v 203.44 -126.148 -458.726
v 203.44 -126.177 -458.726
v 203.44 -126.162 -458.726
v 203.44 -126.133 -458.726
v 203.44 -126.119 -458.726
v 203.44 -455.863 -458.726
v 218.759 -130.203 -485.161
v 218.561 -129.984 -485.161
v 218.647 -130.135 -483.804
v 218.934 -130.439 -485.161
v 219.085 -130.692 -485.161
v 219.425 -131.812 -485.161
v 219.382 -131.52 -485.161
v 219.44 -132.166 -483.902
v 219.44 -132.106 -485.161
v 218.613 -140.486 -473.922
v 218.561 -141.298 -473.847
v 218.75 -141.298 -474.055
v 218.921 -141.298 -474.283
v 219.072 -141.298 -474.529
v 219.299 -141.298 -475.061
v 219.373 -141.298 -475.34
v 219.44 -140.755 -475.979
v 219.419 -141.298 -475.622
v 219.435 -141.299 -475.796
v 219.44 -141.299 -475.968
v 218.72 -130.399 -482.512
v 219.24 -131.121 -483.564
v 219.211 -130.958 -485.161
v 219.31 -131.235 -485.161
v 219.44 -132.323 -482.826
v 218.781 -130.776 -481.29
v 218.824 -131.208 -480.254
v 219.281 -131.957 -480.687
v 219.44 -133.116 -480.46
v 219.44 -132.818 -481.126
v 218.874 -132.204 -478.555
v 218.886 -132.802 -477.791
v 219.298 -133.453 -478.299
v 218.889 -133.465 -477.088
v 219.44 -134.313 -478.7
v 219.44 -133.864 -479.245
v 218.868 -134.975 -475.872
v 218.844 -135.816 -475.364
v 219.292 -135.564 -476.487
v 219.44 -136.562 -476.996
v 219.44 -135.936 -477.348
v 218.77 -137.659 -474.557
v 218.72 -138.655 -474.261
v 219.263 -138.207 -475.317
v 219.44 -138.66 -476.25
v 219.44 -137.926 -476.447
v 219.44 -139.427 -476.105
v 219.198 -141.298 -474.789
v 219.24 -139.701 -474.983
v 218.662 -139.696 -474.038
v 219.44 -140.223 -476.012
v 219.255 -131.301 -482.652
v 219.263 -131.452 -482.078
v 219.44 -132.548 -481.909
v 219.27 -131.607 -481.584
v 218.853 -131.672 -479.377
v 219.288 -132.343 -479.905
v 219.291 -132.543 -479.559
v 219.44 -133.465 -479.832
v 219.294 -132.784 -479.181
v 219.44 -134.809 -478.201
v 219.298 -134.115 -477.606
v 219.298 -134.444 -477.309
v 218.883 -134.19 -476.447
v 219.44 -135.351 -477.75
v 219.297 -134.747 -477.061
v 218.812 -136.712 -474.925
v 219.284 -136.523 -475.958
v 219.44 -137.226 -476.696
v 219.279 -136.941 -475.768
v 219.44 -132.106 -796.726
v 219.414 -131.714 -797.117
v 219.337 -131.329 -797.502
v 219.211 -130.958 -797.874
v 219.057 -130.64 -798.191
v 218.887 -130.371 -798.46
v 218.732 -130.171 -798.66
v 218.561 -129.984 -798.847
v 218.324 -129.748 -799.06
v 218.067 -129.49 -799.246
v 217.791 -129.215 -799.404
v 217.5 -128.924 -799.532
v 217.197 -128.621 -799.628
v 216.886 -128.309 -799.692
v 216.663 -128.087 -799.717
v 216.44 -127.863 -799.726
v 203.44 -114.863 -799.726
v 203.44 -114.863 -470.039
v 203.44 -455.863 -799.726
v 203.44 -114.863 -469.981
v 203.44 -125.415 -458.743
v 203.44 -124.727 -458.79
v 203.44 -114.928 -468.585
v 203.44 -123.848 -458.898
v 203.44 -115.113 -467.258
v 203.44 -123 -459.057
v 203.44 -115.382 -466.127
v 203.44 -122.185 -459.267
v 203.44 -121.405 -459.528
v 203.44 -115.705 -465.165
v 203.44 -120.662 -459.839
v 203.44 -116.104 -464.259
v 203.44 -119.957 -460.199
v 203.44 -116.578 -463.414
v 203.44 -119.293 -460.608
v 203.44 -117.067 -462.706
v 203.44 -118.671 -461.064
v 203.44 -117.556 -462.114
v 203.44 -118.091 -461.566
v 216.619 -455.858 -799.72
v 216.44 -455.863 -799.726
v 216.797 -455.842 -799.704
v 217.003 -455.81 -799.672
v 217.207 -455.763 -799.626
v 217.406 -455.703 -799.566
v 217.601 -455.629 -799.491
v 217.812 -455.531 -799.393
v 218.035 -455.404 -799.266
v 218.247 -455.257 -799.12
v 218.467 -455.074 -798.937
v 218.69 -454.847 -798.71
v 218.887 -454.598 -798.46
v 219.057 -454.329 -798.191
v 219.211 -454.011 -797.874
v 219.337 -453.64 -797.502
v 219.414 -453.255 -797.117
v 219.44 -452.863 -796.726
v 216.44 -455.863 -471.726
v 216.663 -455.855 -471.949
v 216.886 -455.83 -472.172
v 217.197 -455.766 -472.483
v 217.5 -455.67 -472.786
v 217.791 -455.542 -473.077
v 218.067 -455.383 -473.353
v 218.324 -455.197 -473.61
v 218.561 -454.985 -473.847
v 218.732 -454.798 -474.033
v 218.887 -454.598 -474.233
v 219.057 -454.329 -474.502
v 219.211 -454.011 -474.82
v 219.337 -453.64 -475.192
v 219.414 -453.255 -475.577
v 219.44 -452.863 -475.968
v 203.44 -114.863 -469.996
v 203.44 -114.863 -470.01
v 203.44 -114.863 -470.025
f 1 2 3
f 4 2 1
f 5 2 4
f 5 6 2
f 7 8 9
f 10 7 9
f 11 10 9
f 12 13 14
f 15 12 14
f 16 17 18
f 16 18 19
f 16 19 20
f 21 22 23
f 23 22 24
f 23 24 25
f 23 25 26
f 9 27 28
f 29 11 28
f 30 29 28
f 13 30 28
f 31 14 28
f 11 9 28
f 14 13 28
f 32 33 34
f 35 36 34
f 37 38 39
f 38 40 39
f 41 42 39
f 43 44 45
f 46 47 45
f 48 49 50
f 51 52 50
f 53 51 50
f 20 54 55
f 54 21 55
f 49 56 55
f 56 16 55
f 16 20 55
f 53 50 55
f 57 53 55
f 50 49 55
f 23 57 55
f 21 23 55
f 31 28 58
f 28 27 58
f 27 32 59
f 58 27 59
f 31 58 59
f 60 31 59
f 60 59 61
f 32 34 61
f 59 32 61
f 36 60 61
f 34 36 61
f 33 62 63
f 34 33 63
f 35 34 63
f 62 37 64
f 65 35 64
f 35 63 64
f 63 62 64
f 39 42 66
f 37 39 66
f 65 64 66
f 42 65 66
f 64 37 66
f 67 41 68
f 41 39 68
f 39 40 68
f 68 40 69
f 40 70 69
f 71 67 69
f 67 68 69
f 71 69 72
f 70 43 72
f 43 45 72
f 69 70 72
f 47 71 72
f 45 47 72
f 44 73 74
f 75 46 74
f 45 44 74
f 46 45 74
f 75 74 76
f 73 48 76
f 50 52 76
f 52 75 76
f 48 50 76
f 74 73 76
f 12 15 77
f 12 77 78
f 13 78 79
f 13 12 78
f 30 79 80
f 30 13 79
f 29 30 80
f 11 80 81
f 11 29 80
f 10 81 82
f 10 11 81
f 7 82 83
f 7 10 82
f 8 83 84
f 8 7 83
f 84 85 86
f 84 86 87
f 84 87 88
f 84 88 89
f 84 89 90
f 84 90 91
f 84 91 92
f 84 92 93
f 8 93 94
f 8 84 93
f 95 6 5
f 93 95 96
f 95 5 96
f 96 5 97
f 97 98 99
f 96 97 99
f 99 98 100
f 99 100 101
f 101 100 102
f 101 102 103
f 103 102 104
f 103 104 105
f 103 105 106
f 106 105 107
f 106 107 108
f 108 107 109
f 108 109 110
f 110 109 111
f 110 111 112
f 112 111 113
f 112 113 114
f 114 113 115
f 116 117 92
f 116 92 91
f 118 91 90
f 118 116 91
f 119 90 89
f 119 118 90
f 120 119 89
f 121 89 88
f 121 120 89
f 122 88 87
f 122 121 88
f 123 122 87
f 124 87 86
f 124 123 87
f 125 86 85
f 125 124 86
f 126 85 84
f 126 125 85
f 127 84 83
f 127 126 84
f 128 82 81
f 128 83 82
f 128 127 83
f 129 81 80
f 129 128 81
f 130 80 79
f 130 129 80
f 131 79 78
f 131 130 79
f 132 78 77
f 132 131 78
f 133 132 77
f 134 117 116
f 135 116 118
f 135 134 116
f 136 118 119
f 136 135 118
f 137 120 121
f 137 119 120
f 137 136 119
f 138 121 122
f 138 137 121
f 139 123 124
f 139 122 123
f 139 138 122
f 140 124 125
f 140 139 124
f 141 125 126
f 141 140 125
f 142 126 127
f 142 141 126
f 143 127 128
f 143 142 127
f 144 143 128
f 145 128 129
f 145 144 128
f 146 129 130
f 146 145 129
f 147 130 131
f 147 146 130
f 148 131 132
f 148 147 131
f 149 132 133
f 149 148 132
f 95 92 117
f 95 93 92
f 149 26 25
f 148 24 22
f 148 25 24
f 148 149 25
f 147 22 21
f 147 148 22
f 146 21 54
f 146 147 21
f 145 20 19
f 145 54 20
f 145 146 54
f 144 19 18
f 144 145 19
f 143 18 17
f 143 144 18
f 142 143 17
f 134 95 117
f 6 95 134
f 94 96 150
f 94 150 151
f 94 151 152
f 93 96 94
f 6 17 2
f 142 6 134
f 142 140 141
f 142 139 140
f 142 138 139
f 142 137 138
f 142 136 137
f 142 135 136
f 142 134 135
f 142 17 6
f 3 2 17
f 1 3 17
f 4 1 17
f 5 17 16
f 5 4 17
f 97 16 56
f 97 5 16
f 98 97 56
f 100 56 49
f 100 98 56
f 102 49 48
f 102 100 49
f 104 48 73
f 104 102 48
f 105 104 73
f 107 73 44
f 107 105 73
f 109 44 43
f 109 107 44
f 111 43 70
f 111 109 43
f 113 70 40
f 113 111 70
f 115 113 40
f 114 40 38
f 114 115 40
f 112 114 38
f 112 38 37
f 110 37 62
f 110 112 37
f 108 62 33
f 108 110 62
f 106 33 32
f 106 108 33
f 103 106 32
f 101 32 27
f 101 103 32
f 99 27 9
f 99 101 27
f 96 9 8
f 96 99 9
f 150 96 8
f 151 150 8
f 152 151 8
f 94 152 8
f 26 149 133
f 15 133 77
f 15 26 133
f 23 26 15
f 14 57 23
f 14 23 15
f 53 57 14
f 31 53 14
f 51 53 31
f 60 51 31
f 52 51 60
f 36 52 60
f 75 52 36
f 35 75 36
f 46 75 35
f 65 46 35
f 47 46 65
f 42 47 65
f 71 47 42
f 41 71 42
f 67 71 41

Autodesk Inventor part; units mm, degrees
ref_plane "YZ Plane" through (0, 0, 0) normal (1, 0, 0) x (0, 1, 0)
ref_plane "XZ Plane" through (0, 0, 0) normal (0, 1, 0) x (-1, 0, 0)
ref_plane "РабПлоскость1" through (203.4395, -285.3633, -641.5751) normal (1, 0, 0) x (0, 1, 0)
sketch "Эскиз1" plane through (203.4395, -285.3633, -641.5751) normal (1, 0, 0) x (0, 1, 0)
  line L0 (-170.4999, 182.8495) -> (170.5001, 182.8495)
  line L1 (170.5001, 182.8495) -> (170.5001, -158.1505)
  line L2 (170.5001, -158.1505) -> (-170.4999, -158.1505)
  line L3 (-170.4999, -158.1505) -> (-170.4999, 182.8495)
  point P0 (285.3633, 641.5751)
  point P1 (49.5, 182.8495)
  point P2 (-170.4999, 137.85)
  dimension "d5" = 341
  dimension "d6" = 341
extrude "Выдавливание1" add sketch "Эскиз1" along normal blind 16
chamfer "Фаска1" distance 16 angle 45 1 edges at (219.4395, -114.8632, -629.2256)
sketch "Эскиз2" plane through (203.4395, -455.8632, -458.7256) normal (0, 0, 1) x (1, 0, 0)
  line L0 (16, 0) -> (16, 325) projected
  point P0 (-203.4395, 455.8632)
  point P1 (16, 220)
sketch "Эскиз3" plane through (219.4395, -285.3633, -641.5751) normal (1, 0, 0) x (0, 0, -1)
  line L0 (-182.8495, -170.4999) -> (158.1505, -170.4999) projected
  point P0 (-137.85, -170.4999)
chamfer "Фаска2" distance 16 angle 45 1 edges at (219.4395, -293.3631, -458.7256)
fillet "Сопряжение1" radius 16 1 edges at (211.4395, -122.8631, -466.7255)
fillet "Сопряжение2" radius 3 5 edges at (219.4395, -133.8946, -477.757) (219.4395, -299.02, -474.7255) (219.4395, -130.8631, -642.8824) (219.4395, -293.3631, -799.7256) (219.4395, -455.8632, -637.2255)
properties part number "N__side_sticker" material "Древесно-стружечная плита"
